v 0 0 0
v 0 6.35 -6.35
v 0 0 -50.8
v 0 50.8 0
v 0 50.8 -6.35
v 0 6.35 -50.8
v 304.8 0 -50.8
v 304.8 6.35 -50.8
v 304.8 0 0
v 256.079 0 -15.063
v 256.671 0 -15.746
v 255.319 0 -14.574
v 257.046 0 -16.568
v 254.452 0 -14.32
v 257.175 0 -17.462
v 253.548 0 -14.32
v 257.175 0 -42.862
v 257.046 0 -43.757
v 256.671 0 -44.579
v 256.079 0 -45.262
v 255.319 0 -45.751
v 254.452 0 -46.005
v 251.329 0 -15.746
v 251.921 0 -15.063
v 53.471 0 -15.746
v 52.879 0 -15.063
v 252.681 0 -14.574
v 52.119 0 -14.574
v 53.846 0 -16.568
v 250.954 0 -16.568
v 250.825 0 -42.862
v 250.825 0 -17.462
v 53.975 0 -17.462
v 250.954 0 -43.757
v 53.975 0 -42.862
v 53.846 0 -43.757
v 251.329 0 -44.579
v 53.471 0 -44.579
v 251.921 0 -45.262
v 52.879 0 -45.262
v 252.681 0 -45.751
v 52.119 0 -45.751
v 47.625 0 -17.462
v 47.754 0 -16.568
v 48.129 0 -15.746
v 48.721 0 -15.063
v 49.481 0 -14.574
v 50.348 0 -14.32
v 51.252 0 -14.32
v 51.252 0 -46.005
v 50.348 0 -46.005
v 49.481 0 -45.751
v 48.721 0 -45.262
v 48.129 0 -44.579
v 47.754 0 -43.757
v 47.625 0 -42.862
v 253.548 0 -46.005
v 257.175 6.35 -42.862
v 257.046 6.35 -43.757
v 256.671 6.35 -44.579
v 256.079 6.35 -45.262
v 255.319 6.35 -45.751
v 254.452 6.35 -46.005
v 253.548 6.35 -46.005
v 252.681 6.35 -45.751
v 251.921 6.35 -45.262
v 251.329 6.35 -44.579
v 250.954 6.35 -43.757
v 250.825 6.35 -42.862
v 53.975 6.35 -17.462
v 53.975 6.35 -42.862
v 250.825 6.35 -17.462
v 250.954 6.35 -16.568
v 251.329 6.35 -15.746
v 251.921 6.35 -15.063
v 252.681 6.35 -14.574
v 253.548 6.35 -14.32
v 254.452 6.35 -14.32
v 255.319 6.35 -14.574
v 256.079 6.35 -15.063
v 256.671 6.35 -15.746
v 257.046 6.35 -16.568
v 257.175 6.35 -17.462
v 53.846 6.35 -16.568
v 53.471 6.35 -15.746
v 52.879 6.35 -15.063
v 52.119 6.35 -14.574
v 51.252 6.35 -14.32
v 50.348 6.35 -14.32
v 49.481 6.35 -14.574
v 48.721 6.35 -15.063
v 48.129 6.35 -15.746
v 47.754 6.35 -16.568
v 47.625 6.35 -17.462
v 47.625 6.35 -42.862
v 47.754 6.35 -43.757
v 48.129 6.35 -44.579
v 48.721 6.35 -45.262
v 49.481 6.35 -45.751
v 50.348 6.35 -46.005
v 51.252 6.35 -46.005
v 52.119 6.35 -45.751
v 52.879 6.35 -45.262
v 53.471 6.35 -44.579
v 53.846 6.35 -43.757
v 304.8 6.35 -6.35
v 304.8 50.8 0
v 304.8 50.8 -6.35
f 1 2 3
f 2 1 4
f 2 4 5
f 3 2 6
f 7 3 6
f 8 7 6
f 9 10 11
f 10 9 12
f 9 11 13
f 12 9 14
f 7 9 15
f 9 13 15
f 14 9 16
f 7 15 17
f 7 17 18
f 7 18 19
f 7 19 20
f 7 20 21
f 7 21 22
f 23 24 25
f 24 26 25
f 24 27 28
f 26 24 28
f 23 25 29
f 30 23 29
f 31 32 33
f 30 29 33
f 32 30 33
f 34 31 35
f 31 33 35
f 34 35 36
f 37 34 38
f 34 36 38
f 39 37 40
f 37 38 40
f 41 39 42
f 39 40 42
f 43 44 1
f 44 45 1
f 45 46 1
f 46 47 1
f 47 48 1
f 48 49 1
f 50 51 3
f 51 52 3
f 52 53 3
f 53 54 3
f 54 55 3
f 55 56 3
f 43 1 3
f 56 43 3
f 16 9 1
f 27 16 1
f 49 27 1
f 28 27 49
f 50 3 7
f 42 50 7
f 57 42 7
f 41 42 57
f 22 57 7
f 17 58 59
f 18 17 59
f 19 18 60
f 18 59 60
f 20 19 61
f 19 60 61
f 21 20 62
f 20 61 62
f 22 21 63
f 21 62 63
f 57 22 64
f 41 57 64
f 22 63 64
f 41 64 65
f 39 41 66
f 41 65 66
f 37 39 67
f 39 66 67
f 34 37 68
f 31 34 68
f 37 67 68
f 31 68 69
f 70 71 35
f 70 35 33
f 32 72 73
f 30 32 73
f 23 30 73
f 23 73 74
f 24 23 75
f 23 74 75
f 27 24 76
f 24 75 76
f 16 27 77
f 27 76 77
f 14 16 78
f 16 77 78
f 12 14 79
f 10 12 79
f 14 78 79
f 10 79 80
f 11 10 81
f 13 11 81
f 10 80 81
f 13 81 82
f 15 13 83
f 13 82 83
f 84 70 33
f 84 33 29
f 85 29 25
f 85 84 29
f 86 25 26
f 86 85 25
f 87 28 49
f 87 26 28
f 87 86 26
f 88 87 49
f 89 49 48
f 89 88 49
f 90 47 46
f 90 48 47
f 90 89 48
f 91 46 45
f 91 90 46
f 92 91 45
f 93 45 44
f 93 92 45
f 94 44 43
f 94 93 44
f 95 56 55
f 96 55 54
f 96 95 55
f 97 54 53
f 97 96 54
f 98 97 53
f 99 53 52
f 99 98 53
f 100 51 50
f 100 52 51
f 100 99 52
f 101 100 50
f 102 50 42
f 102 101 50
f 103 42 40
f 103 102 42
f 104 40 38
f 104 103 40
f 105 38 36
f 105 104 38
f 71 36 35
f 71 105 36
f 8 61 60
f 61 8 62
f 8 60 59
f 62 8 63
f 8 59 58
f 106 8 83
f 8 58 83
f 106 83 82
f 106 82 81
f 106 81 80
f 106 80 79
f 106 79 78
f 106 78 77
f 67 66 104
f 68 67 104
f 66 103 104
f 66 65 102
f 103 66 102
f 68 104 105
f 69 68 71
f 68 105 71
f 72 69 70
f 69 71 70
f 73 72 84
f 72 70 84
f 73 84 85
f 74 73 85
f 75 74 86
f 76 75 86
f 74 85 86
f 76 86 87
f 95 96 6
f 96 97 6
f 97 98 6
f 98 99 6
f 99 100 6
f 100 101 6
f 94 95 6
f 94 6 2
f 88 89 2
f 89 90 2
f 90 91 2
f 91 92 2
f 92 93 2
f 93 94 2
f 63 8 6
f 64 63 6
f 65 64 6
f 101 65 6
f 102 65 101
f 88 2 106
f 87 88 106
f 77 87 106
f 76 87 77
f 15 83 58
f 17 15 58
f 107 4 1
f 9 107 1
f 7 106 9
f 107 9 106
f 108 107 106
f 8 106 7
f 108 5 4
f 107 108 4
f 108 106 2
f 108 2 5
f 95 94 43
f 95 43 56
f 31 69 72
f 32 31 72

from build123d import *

# Parameters (mm, degrees)
BOSS_EXTRUDE1_DEPTH = 304.8
CUT_EXTRUDE1_DEPTH  = 313.185013253


with BuildPart() as part:
    # Sketch1 → Boss-Extrude1 (new body)
    with BuildSketch(Plane(origin=(0, 0, 0), x_dir=(0, 0, -1), z_dir=(1, 0, 0))):
        Polygon((0, 0), (50.8, 0), (50.8, 6.35), (6.35, 6.35), (6.35, 50.8), (0, 50.8), align=None)
    extrude(amount=BOSS_EXTRUDE1_DEPTH)

    # Sketch2 → Cut-Extrude1 (cut, through all)
    with BuildSketch(Plane(origin=(0, 6.35, 0), x_dir=(1, 0, 0), z_dir=(0, 1, 0))):
        with BuildLine():
            Line((53.975, 42.8625), (53.975, 17.4625))
            ThreePointArc((53.975, 17.4625), (50.8, 14.2875), (47.625, 17.4625))
            Line((47.625, 17.4625), (47.625, 42.8625))
            ThreePointArc((47.625, 42.8625), (50.8, 46.0375), (53.975, 42.8625))
        make_face()
        with BuildLine():
            Line((250.825, 42.8625), (250.825, 17.4625))
            ThreePointArc((250.825, 17.4625), (254, 14.2875), (257.175, 17.4625))
            Line((257.175, 17.4625), (257.175, 42.8625))
            ThreePointArc((257.175, 42.8625), (254, 46.0375), (250.825, 42.8625))
        make_face()
    extrude(amount=-CUT_EXTRUDE1_DEPTH, mode=Mode.SUBTRACT)


solid = part.part
